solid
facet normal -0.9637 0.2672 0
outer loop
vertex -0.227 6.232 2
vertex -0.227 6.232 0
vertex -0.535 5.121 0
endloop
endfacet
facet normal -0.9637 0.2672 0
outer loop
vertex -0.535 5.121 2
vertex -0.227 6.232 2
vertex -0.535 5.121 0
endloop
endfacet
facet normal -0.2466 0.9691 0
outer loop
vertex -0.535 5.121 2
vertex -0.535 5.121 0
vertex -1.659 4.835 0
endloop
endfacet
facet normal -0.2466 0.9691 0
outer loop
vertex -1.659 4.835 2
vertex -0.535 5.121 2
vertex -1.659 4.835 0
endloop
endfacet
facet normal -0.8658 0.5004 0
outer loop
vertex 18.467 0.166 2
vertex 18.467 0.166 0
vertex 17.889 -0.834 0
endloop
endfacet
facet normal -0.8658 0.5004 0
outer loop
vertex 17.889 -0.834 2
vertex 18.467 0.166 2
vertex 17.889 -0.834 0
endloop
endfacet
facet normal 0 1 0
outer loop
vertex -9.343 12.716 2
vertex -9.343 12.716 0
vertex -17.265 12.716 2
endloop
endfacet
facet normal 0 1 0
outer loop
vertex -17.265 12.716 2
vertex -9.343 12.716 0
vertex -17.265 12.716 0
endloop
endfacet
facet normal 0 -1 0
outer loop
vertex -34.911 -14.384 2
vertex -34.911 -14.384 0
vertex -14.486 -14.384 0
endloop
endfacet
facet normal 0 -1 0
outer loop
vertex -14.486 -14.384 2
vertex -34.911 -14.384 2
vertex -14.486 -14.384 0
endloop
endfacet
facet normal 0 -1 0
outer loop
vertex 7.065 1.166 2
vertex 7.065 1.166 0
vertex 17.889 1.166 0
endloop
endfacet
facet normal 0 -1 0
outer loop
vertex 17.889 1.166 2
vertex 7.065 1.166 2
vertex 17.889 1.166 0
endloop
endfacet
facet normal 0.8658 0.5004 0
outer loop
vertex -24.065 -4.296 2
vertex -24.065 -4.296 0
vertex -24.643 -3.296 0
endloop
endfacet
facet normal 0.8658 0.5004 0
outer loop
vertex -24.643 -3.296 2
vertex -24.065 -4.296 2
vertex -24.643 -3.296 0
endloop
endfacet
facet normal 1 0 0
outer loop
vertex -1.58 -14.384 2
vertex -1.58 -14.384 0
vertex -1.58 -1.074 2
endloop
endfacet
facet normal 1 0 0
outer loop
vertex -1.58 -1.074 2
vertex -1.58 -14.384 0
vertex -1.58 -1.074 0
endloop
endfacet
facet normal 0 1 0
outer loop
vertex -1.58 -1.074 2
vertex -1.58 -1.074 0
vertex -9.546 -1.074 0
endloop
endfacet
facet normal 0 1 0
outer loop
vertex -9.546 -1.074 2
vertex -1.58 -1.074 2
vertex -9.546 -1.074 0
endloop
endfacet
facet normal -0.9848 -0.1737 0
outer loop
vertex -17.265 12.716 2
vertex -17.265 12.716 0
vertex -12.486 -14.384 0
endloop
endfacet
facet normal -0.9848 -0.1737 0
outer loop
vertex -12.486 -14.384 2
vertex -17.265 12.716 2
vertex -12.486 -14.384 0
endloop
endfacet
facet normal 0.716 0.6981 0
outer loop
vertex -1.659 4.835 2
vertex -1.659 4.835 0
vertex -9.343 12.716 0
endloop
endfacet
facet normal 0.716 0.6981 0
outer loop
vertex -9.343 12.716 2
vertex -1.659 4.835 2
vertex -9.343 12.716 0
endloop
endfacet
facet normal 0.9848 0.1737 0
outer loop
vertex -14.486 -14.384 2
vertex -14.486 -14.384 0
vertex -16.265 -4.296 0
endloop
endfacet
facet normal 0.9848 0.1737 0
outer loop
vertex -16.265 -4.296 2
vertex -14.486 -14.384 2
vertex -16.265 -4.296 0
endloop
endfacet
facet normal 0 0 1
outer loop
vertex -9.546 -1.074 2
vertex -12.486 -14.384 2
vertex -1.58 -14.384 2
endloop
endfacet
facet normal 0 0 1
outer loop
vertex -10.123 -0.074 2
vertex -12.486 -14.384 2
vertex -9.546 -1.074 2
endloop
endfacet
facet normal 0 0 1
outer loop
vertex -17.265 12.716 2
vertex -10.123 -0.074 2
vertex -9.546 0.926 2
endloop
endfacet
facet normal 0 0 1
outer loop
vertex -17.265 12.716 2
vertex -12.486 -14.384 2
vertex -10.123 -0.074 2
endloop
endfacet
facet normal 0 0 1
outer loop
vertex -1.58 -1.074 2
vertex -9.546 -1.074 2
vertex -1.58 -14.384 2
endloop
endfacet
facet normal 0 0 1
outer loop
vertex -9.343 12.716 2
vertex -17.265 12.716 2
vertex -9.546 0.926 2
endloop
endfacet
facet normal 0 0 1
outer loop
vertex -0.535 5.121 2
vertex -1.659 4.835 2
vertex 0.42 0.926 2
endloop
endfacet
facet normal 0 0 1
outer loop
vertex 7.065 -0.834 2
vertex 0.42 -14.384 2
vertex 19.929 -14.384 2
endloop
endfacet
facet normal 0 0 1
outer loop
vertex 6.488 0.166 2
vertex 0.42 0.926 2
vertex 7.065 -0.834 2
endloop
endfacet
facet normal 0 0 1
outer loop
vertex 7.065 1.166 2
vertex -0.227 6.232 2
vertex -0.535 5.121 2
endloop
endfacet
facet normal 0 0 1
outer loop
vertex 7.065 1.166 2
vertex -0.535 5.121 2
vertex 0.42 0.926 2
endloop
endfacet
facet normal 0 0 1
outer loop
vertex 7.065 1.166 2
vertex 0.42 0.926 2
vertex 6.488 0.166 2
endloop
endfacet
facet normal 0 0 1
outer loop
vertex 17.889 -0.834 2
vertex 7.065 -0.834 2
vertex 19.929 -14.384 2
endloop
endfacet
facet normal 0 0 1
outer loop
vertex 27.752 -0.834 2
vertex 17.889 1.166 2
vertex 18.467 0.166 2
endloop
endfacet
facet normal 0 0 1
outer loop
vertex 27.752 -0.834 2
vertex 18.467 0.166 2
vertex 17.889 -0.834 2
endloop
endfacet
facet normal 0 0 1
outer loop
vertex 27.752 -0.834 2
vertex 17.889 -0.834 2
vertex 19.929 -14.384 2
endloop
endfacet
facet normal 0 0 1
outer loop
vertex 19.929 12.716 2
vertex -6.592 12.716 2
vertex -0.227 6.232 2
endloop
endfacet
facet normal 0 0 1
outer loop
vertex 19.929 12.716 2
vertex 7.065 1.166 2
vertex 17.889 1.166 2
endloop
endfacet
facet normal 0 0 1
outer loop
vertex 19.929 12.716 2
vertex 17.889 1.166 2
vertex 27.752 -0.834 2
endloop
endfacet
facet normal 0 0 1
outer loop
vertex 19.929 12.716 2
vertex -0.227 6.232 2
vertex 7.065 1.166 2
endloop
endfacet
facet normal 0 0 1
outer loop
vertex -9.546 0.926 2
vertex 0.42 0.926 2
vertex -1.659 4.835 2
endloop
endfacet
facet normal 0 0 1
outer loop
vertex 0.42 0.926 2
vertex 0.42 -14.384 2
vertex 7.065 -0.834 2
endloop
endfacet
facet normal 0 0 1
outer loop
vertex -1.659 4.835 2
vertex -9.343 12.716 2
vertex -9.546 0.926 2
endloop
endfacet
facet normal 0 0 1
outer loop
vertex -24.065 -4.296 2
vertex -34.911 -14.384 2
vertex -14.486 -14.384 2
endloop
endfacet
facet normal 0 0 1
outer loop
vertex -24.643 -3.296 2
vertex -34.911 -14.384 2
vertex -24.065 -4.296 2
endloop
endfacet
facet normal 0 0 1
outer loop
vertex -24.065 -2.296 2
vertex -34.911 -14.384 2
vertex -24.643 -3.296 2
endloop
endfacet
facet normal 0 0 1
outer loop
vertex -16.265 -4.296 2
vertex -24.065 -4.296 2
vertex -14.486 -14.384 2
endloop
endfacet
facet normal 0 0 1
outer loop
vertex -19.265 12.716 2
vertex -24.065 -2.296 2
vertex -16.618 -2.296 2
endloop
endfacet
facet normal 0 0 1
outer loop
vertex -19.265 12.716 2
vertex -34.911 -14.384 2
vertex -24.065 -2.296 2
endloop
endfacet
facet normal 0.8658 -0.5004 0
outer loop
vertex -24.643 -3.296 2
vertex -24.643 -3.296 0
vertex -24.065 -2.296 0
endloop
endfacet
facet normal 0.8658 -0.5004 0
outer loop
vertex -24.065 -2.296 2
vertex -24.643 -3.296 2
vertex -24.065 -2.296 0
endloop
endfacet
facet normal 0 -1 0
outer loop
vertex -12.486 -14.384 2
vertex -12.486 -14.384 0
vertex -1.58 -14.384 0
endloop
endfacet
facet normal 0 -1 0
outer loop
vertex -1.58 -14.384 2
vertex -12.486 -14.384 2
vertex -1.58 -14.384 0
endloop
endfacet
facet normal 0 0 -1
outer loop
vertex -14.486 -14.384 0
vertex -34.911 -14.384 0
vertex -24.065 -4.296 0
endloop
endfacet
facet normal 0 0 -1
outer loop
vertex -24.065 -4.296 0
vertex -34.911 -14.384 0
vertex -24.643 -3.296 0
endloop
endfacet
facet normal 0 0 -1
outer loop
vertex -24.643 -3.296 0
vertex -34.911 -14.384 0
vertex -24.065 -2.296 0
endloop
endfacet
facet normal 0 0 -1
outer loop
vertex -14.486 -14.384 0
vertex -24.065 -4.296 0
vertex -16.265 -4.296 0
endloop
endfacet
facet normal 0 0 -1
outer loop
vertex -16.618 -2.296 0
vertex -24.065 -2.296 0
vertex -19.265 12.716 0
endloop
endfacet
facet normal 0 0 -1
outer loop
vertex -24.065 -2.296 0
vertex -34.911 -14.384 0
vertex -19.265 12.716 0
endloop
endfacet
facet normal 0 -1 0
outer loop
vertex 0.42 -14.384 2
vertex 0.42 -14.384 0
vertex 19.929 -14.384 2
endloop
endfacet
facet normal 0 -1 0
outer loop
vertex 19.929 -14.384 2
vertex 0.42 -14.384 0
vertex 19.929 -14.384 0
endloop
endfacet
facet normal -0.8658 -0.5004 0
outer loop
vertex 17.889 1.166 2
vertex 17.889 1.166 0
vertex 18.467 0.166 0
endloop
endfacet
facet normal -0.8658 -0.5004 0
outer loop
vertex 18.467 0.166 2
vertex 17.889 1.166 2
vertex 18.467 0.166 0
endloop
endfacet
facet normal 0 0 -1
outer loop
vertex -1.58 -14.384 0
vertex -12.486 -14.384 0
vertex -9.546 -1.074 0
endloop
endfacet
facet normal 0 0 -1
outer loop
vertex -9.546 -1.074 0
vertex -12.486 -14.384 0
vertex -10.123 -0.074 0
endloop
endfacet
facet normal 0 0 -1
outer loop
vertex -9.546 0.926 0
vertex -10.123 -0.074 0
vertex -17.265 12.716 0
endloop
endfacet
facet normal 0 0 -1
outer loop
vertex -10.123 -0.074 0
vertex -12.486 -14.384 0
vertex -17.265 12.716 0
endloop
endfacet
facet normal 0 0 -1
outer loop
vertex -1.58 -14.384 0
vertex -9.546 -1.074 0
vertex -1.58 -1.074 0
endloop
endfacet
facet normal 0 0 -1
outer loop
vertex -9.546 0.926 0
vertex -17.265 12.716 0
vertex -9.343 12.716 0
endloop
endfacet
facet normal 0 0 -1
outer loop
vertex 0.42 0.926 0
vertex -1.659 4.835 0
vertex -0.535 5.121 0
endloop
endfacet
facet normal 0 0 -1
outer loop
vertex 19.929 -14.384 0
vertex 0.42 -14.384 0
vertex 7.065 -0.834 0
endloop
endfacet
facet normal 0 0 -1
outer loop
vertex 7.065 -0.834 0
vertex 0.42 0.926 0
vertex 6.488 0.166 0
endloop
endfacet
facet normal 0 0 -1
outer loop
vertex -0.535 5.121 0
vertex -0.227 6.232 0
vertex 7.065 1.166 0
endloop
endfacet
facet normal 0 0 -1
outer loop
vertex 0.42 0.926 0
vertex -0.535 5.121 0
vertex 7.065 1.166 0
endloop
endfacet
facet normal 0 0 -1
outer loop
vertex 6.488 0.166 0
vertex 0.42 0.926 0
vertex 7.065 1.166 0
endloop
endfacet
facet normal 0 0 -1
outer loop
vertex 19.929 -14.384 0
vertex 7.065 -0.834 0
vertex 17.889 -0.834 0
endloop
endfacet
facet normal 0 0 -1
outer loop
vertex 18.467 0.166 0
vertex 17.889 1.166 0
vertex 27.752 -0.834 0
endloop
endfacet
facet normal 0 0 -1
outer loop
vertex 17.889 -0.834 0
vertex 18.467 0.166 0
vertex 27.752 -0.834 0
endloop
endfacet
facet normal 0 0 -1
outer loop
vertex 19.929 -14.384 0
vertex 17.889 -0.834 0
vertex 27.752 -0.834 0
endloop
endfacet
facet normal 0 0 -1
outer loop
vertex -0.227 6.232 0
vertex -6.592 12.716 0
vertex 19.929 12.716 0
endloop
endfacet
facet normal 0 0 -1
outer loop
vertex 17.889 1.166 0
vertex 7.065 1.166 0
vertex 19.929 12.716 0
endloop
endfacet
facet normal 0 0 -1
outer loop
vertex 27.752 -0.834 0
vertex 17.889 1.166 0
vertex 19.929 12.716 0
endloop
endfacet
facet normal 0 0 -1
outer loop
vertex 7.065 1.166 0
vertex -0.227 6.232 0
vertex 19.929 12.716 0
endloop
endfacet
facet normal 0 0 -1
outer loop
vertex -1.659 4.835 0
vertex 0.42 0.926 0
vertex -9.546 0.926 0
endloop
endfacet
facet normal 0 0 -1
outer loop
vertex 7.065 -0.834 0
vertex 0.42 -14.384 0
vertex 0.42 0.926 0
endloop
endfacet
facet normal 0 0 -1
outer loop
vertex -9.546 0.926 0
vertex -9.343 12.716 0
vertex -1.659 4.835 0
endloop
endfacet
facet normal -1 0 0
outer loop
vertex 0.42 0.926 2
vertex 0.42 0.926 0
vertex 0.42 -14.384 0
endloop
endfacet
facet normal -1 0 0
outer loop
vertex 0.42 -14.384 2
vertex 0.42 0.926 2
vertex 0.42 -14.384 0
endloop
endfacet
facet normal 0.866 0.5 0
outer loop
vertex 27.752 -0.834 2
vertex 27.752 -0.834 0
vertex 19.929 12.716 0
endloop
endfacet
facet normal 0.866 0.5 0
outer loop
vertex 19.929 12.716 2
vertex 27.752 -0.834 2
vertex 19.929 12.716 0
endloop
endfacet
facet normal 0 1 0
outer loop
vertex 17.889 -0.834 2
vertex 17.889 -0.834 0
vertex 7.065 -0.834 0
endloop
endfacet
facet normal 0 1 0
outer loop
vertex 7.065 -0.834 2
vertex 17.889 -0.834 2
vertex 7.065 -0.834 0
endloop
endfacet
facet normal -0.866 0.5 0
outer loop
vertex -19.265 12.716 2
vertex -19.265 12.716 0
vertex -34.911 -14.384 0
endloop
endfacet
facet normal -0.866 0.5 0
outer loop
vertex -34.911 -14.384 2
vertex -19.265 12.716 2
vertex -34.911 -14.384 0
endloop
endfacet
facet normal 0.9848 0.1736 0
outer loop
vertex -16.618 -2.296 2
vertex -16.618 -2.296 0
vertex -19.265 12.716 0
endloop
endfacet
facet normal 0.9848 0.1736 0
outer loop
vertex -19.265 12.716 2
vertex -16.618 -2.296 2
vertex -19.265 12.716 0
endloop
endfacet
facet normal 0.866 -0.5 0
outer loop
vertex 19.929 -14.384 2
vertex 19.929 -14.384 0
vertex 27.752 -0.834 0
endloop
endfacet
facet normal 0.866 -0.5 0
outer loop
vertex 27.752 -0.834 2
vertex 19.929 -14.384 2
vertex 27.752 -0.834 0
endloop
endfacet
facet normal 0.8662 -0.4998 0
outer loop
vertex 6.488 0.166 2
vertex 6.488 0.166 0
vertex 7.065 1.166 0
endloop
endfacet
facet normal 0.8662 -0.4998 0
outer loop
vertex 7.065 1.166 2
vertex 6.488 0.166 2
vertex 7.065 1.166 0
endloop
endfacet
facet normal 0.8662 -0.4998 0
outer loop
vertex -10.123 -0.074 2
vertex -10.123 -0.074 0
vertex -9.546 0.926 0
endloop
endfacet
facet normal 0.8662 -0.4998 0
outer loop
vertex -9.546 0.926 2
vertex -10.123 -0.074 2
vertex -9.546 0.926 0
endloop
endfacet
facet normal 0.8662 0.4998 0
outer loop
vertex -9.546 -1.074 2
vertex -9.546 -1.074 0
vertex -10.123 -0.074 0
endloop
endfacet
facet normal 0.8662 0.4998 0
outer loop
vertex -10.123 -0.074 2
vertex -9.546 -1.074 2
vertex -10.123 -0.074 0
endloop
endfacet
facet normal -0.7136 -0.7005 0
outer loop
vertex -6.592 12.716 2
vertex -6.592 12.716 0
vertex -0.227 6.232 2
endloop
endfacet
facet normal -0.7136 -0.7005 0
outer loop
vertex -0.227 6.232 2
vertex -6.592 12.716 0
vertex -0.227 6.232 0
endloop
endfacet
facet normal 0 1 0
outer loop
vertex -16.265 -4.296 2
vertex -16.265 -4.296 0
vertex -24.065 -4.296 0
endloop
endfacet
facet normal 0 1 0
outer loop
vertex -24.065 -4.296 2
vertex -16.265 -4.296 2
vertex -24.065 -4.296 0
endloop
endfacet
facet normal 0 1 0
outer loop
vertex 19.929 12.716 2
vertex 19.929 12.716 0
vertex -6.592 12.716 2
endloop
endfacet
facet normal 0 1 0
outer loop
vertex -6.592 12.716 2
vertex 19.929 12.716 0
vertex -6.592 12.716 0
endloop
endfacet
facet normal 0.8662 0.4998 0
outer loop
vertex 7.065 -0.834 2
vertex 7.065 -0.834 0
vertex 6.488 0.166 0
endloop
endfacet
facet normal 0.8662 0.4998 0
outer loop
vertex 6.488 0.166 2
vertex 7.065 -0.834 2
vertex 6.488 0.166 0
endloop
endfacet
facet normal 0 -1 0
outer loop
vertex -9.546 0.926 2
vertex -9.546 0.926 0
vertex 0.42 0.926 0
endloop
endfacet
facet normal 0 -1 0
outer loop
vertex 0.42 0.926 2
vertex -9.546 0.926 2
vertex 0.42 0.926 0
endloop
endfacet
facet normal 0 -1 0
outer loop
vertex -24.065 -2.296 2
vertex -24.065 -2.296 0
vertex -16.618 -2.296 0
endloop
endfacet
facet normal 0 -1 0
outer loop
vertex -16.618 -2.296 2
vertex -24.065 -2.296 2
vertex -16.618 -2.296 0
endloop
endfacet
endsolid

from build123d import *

# Parameters (mm, degrees)
F1_DEPTH = 2


with BuildPart() as f1:
    # F0 (on Top) → F1 (new body)
    with BuildSketch(Plane.XY):
        Polygon((-17.264818, 12.716242), (-12.486297, -14.384092), (-1.580196, -14.384092), (-1.580196, -1.073903), (-9.546066, -1.073903), (-10.123416, -0.073903), (-9.546066, 0.926097), (0.419804, 0.926097), (0.419804, -14.384092), (19.928842, -14.384092), (27.752034, -0.833925), (19.928842, 12.716242), (-6.591862, 12.716242), (-0.226701, 6.231545), (-0.535331, 5.121141), (-1.658654, 4.835296), (-9.343094, 12.716242), align=None)
        Polygon((18.466761, 0.166075), (17.889411, -0.833925), (7.065362, -0.833925), (6.488011, 0.166075), (7.065362, 1.166075), (17.889411, 1.166075), align=None, mode=Mode.SUBTRACT)
        Polygon((-19.264818, 12.716242), (-34.911203, -14.384092), (-14.486297, -14.384092), (-16.265065, -4.296201), (-24.065312, -4.296201), (-24.642662, -3.296201), (-24.065312, -2.296201), (-16.617719, -2.296201), align=None)
    extrude(amount=F1_DEPTH)


solid = f1.part
